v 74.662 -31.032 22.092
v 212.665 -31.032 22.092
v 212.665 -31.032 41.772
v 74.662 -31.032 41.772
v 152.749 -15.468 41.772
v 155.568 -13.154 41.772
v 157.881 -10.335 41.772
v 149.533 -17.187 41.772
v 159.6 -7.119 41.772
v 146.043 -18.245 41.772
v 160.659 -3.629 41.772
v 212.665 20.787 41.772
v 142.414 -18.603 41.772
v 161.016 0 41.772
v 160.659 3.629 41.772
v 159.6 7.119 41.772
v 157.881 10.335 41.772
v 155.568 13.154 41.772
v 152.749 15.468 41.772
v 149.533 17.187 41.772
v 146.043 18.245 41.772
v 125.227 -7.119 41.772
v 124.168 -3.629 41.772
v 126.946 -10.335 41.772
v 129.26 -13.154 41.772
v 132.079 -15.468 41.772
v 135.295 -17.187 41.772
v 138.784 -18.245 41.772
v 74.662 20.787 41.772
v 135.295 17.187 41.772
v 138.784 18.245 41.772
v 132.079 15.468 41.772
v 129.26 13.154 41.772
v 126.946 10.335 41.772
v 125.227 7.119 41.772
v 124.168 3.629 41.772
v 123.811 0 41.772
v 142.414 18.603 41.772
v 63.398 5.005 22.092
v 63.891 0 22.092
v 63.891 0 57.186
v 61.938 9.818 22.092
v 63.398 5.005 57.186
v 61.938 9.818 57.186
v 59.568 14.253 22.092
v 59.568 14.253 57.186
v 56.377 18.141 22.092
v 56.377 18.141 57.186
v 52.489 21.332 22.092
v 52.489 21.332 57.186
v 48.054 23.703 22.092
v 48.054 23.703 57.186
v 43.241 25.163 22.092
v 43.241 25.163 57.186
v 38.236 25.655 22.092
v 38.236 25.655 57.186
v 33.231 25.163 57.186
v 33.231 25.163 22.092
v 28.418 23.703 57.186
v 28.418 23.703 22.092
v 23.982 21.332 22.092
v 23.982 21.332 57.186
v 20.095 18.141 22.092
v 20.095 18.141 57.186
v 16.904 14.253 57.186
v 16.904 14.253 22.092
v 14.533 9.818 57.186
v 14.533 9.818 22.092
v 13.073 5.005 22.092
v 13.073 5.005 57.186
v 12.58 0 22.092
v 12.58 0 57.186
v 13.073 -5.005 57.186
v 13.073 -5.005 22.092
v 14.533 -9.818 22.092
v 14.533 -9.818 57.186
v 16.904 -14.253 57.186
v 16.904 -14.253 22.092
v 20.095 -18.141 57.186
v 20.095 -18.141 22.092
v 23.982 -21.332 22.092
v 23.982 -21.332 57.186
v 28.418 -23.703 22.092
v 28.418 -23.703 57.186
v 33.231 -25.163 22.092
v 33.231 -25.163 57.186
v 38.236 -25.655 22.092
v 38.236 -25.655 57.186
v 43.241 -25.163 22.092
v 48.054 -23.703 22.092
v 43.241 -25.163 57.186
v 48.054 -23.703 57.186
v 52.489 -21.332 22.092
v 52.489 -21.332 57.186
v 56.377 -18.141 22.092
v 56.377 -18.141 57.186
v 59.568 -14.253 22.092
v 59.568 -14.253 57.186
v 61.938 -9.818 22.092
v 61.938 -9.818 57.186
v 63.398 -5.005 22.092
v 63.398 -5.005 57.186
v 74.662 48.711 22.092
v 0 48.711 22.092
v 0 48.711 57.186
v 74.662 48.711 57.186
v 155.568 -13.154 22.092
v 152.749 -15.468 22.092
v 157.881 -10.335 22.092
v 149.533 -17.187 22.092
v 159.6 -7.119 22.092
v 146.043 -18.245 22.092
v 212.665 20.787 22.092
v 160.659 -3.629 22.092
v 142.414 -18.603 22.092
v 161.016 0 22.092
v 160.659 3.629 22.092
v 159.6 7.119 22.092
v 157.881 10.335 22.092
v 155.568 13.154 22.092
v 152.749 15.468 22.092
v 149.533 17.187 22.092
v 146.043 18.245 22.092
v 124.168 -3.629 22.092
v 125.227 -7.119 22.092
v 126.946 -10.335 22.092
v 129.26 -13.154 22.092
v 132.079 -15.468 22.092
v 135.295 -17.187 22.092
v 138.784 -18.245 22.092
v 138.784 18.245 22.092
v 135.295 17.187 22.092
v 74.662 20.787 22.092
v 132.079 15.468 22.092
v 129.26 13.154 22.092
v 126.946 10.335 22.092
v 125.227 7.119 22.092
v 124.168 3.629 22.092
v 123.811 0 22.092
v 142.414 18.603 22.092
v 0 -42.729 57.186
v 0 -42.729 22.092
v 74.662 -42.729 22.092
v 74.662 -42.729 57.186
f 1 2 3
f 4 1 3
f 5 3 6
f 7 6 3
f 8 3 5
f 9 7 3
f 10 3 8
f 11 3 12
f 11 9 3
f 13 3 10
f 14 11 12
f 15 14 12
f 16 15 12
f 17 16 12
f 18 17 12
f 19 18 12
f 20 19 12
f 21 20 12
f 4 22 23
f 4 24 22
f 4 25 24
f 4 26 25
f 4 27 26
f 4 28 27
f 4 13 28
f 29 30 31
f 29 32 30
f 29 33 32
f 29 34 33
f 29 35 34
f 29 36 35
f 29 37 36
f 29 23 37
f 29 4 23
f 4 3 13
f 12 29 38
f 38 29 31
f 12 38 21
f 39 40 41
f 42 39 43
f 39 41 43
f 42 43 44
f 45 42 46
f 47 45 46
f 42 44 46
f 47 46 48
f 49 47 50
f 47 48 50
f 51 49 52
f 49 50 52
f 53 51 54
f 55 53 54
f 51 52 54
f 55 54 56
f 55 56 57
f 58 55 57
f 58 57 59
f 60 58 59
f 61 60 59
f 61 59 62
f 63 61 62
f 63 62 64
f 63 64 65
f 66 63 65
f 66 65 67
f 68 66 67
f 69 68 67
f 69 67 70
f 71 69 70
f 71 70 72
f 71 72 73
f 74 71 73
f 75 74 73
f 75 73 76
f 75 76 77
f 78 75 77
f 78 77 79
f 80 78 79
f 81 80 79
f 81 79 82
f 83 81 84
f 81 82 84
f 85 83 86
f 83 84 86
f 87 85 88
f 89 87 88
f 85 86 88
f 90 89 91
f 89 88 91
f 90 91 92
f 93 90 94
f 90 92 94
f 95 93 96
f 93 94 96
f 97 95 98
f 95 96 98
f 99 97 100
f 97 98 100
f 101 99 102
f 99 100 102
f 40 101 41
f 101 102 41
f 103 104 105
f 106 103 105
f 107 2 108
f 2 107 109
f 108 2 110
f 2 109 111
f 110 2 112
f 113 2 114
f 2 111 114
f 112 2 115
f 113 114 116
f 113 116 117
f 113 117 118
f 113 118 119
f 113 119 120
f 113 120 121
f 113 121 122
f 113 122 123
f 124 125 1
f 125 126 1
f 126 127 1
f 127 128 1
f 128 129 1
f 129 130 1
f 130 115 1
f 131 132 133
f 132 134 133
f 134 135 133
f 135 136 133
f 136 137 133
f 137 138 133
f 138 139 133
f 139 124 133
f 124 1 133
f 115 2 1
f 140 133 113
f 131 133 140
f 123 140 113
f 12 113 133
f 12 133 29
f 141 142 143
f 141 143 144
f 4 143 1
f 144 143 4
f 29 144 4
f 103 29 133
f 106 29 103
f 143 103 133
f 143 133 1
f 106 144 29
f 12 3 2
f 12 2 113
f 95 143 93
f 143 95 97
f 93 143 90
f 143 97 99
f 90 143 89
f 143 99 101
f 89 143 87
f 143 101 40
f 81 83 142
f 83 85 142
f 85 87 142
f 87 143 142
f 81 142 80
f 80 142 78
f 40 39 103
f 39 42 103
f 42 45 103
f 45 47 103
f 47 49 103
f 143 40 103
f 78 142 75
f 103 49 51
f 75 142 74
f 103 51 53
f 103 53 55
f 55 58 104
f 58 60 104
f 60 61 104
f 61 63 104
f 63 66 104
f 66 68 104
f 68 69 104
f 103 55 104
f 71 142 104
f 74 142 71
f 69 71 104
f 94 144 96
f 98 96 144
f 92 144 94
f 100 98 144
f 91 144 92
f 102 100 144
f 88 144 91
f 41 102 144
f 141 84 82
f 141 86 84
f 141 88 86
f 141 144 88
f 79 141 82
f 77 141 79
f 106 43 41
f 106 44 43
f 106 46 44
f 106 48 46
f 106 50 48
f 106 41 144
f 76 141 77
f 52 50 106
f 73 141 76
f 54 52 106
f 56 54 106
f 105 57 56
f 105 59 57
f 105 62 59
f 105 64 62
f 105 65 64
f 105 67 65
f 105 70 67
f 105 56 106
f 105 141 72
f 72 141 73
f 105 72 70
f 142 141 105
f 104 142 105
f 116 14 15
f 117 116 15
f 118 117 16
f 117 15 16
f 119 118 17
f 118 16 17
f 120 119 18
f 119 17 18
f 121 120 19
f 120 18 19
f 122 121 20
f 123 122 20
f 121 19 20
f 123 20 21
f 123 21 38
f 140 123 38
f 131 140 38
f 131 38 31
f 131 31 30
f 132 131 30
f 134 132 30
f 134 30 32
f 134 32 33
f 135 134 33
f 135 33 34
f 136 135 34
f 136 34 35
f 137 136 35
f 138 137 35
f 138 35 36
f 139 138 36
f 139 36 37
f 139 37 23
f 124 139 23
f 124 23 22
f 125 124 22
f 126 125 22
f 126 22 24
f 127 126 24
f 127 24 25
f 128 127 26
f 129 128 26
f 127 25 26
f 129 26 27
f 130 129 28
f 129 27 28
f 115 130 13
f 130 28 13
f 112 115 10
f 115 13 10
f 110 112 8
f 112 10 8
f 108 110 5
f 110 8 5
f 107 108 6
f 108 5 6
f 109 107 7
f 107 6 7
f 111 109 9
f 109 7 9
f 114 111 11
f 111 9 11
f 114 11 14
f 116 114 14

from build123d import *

# Parameters (mm, degrees)
F0_W     = 91.44
F0_H     = 35.094067
F1_DEPTH = 74.66243
F2_R     = 25.655488
F3_DEPTH = 59.964648
F4_W     = 51.819967
F4_H     = 19.67985
F5_DEPTH = 138.002442
F6_R     = 18.602683
F7_DEPTH = 87.077601


with BuildPart() as f1:
    # F0 (on Right) → F1 (new body)
    with BuildSketch(Plane.YZ):
        with Locations((2.991382, 39.639005)):
            Rectangle(F0_W, F0_H)
    extrude(amount=F1_DEPTH)

    # F2 (on face) → F3 (cut)
    with BuildSketch(Plane.XY.offset(57.186039)):
        with Locations((38.235784, 0)):
            Circle(F2_R)
    extrude(amount=-F3_DEPTH, mode=Mode.SUBTRACT)

    # F4 (on face) → F5 (join)
    with BuildSketch(Plane.YZ.offset(74.66243)):
        with Locations((-5.12249, 31.931897)):
            Rectangle(F4_W, F4_H)
    extrude(amount=F5_DEPTH)

    # F6 (on face) → F7 (cut)
    with BuildSketch(Plane.XY.offset(41.771822)):
        with Locations((142.413676, 0)):
            Circle(F6_R)
    extrude(amount=-F7_DEPTH, mode=Mode.SUBTRACT)


solid = f1.part
